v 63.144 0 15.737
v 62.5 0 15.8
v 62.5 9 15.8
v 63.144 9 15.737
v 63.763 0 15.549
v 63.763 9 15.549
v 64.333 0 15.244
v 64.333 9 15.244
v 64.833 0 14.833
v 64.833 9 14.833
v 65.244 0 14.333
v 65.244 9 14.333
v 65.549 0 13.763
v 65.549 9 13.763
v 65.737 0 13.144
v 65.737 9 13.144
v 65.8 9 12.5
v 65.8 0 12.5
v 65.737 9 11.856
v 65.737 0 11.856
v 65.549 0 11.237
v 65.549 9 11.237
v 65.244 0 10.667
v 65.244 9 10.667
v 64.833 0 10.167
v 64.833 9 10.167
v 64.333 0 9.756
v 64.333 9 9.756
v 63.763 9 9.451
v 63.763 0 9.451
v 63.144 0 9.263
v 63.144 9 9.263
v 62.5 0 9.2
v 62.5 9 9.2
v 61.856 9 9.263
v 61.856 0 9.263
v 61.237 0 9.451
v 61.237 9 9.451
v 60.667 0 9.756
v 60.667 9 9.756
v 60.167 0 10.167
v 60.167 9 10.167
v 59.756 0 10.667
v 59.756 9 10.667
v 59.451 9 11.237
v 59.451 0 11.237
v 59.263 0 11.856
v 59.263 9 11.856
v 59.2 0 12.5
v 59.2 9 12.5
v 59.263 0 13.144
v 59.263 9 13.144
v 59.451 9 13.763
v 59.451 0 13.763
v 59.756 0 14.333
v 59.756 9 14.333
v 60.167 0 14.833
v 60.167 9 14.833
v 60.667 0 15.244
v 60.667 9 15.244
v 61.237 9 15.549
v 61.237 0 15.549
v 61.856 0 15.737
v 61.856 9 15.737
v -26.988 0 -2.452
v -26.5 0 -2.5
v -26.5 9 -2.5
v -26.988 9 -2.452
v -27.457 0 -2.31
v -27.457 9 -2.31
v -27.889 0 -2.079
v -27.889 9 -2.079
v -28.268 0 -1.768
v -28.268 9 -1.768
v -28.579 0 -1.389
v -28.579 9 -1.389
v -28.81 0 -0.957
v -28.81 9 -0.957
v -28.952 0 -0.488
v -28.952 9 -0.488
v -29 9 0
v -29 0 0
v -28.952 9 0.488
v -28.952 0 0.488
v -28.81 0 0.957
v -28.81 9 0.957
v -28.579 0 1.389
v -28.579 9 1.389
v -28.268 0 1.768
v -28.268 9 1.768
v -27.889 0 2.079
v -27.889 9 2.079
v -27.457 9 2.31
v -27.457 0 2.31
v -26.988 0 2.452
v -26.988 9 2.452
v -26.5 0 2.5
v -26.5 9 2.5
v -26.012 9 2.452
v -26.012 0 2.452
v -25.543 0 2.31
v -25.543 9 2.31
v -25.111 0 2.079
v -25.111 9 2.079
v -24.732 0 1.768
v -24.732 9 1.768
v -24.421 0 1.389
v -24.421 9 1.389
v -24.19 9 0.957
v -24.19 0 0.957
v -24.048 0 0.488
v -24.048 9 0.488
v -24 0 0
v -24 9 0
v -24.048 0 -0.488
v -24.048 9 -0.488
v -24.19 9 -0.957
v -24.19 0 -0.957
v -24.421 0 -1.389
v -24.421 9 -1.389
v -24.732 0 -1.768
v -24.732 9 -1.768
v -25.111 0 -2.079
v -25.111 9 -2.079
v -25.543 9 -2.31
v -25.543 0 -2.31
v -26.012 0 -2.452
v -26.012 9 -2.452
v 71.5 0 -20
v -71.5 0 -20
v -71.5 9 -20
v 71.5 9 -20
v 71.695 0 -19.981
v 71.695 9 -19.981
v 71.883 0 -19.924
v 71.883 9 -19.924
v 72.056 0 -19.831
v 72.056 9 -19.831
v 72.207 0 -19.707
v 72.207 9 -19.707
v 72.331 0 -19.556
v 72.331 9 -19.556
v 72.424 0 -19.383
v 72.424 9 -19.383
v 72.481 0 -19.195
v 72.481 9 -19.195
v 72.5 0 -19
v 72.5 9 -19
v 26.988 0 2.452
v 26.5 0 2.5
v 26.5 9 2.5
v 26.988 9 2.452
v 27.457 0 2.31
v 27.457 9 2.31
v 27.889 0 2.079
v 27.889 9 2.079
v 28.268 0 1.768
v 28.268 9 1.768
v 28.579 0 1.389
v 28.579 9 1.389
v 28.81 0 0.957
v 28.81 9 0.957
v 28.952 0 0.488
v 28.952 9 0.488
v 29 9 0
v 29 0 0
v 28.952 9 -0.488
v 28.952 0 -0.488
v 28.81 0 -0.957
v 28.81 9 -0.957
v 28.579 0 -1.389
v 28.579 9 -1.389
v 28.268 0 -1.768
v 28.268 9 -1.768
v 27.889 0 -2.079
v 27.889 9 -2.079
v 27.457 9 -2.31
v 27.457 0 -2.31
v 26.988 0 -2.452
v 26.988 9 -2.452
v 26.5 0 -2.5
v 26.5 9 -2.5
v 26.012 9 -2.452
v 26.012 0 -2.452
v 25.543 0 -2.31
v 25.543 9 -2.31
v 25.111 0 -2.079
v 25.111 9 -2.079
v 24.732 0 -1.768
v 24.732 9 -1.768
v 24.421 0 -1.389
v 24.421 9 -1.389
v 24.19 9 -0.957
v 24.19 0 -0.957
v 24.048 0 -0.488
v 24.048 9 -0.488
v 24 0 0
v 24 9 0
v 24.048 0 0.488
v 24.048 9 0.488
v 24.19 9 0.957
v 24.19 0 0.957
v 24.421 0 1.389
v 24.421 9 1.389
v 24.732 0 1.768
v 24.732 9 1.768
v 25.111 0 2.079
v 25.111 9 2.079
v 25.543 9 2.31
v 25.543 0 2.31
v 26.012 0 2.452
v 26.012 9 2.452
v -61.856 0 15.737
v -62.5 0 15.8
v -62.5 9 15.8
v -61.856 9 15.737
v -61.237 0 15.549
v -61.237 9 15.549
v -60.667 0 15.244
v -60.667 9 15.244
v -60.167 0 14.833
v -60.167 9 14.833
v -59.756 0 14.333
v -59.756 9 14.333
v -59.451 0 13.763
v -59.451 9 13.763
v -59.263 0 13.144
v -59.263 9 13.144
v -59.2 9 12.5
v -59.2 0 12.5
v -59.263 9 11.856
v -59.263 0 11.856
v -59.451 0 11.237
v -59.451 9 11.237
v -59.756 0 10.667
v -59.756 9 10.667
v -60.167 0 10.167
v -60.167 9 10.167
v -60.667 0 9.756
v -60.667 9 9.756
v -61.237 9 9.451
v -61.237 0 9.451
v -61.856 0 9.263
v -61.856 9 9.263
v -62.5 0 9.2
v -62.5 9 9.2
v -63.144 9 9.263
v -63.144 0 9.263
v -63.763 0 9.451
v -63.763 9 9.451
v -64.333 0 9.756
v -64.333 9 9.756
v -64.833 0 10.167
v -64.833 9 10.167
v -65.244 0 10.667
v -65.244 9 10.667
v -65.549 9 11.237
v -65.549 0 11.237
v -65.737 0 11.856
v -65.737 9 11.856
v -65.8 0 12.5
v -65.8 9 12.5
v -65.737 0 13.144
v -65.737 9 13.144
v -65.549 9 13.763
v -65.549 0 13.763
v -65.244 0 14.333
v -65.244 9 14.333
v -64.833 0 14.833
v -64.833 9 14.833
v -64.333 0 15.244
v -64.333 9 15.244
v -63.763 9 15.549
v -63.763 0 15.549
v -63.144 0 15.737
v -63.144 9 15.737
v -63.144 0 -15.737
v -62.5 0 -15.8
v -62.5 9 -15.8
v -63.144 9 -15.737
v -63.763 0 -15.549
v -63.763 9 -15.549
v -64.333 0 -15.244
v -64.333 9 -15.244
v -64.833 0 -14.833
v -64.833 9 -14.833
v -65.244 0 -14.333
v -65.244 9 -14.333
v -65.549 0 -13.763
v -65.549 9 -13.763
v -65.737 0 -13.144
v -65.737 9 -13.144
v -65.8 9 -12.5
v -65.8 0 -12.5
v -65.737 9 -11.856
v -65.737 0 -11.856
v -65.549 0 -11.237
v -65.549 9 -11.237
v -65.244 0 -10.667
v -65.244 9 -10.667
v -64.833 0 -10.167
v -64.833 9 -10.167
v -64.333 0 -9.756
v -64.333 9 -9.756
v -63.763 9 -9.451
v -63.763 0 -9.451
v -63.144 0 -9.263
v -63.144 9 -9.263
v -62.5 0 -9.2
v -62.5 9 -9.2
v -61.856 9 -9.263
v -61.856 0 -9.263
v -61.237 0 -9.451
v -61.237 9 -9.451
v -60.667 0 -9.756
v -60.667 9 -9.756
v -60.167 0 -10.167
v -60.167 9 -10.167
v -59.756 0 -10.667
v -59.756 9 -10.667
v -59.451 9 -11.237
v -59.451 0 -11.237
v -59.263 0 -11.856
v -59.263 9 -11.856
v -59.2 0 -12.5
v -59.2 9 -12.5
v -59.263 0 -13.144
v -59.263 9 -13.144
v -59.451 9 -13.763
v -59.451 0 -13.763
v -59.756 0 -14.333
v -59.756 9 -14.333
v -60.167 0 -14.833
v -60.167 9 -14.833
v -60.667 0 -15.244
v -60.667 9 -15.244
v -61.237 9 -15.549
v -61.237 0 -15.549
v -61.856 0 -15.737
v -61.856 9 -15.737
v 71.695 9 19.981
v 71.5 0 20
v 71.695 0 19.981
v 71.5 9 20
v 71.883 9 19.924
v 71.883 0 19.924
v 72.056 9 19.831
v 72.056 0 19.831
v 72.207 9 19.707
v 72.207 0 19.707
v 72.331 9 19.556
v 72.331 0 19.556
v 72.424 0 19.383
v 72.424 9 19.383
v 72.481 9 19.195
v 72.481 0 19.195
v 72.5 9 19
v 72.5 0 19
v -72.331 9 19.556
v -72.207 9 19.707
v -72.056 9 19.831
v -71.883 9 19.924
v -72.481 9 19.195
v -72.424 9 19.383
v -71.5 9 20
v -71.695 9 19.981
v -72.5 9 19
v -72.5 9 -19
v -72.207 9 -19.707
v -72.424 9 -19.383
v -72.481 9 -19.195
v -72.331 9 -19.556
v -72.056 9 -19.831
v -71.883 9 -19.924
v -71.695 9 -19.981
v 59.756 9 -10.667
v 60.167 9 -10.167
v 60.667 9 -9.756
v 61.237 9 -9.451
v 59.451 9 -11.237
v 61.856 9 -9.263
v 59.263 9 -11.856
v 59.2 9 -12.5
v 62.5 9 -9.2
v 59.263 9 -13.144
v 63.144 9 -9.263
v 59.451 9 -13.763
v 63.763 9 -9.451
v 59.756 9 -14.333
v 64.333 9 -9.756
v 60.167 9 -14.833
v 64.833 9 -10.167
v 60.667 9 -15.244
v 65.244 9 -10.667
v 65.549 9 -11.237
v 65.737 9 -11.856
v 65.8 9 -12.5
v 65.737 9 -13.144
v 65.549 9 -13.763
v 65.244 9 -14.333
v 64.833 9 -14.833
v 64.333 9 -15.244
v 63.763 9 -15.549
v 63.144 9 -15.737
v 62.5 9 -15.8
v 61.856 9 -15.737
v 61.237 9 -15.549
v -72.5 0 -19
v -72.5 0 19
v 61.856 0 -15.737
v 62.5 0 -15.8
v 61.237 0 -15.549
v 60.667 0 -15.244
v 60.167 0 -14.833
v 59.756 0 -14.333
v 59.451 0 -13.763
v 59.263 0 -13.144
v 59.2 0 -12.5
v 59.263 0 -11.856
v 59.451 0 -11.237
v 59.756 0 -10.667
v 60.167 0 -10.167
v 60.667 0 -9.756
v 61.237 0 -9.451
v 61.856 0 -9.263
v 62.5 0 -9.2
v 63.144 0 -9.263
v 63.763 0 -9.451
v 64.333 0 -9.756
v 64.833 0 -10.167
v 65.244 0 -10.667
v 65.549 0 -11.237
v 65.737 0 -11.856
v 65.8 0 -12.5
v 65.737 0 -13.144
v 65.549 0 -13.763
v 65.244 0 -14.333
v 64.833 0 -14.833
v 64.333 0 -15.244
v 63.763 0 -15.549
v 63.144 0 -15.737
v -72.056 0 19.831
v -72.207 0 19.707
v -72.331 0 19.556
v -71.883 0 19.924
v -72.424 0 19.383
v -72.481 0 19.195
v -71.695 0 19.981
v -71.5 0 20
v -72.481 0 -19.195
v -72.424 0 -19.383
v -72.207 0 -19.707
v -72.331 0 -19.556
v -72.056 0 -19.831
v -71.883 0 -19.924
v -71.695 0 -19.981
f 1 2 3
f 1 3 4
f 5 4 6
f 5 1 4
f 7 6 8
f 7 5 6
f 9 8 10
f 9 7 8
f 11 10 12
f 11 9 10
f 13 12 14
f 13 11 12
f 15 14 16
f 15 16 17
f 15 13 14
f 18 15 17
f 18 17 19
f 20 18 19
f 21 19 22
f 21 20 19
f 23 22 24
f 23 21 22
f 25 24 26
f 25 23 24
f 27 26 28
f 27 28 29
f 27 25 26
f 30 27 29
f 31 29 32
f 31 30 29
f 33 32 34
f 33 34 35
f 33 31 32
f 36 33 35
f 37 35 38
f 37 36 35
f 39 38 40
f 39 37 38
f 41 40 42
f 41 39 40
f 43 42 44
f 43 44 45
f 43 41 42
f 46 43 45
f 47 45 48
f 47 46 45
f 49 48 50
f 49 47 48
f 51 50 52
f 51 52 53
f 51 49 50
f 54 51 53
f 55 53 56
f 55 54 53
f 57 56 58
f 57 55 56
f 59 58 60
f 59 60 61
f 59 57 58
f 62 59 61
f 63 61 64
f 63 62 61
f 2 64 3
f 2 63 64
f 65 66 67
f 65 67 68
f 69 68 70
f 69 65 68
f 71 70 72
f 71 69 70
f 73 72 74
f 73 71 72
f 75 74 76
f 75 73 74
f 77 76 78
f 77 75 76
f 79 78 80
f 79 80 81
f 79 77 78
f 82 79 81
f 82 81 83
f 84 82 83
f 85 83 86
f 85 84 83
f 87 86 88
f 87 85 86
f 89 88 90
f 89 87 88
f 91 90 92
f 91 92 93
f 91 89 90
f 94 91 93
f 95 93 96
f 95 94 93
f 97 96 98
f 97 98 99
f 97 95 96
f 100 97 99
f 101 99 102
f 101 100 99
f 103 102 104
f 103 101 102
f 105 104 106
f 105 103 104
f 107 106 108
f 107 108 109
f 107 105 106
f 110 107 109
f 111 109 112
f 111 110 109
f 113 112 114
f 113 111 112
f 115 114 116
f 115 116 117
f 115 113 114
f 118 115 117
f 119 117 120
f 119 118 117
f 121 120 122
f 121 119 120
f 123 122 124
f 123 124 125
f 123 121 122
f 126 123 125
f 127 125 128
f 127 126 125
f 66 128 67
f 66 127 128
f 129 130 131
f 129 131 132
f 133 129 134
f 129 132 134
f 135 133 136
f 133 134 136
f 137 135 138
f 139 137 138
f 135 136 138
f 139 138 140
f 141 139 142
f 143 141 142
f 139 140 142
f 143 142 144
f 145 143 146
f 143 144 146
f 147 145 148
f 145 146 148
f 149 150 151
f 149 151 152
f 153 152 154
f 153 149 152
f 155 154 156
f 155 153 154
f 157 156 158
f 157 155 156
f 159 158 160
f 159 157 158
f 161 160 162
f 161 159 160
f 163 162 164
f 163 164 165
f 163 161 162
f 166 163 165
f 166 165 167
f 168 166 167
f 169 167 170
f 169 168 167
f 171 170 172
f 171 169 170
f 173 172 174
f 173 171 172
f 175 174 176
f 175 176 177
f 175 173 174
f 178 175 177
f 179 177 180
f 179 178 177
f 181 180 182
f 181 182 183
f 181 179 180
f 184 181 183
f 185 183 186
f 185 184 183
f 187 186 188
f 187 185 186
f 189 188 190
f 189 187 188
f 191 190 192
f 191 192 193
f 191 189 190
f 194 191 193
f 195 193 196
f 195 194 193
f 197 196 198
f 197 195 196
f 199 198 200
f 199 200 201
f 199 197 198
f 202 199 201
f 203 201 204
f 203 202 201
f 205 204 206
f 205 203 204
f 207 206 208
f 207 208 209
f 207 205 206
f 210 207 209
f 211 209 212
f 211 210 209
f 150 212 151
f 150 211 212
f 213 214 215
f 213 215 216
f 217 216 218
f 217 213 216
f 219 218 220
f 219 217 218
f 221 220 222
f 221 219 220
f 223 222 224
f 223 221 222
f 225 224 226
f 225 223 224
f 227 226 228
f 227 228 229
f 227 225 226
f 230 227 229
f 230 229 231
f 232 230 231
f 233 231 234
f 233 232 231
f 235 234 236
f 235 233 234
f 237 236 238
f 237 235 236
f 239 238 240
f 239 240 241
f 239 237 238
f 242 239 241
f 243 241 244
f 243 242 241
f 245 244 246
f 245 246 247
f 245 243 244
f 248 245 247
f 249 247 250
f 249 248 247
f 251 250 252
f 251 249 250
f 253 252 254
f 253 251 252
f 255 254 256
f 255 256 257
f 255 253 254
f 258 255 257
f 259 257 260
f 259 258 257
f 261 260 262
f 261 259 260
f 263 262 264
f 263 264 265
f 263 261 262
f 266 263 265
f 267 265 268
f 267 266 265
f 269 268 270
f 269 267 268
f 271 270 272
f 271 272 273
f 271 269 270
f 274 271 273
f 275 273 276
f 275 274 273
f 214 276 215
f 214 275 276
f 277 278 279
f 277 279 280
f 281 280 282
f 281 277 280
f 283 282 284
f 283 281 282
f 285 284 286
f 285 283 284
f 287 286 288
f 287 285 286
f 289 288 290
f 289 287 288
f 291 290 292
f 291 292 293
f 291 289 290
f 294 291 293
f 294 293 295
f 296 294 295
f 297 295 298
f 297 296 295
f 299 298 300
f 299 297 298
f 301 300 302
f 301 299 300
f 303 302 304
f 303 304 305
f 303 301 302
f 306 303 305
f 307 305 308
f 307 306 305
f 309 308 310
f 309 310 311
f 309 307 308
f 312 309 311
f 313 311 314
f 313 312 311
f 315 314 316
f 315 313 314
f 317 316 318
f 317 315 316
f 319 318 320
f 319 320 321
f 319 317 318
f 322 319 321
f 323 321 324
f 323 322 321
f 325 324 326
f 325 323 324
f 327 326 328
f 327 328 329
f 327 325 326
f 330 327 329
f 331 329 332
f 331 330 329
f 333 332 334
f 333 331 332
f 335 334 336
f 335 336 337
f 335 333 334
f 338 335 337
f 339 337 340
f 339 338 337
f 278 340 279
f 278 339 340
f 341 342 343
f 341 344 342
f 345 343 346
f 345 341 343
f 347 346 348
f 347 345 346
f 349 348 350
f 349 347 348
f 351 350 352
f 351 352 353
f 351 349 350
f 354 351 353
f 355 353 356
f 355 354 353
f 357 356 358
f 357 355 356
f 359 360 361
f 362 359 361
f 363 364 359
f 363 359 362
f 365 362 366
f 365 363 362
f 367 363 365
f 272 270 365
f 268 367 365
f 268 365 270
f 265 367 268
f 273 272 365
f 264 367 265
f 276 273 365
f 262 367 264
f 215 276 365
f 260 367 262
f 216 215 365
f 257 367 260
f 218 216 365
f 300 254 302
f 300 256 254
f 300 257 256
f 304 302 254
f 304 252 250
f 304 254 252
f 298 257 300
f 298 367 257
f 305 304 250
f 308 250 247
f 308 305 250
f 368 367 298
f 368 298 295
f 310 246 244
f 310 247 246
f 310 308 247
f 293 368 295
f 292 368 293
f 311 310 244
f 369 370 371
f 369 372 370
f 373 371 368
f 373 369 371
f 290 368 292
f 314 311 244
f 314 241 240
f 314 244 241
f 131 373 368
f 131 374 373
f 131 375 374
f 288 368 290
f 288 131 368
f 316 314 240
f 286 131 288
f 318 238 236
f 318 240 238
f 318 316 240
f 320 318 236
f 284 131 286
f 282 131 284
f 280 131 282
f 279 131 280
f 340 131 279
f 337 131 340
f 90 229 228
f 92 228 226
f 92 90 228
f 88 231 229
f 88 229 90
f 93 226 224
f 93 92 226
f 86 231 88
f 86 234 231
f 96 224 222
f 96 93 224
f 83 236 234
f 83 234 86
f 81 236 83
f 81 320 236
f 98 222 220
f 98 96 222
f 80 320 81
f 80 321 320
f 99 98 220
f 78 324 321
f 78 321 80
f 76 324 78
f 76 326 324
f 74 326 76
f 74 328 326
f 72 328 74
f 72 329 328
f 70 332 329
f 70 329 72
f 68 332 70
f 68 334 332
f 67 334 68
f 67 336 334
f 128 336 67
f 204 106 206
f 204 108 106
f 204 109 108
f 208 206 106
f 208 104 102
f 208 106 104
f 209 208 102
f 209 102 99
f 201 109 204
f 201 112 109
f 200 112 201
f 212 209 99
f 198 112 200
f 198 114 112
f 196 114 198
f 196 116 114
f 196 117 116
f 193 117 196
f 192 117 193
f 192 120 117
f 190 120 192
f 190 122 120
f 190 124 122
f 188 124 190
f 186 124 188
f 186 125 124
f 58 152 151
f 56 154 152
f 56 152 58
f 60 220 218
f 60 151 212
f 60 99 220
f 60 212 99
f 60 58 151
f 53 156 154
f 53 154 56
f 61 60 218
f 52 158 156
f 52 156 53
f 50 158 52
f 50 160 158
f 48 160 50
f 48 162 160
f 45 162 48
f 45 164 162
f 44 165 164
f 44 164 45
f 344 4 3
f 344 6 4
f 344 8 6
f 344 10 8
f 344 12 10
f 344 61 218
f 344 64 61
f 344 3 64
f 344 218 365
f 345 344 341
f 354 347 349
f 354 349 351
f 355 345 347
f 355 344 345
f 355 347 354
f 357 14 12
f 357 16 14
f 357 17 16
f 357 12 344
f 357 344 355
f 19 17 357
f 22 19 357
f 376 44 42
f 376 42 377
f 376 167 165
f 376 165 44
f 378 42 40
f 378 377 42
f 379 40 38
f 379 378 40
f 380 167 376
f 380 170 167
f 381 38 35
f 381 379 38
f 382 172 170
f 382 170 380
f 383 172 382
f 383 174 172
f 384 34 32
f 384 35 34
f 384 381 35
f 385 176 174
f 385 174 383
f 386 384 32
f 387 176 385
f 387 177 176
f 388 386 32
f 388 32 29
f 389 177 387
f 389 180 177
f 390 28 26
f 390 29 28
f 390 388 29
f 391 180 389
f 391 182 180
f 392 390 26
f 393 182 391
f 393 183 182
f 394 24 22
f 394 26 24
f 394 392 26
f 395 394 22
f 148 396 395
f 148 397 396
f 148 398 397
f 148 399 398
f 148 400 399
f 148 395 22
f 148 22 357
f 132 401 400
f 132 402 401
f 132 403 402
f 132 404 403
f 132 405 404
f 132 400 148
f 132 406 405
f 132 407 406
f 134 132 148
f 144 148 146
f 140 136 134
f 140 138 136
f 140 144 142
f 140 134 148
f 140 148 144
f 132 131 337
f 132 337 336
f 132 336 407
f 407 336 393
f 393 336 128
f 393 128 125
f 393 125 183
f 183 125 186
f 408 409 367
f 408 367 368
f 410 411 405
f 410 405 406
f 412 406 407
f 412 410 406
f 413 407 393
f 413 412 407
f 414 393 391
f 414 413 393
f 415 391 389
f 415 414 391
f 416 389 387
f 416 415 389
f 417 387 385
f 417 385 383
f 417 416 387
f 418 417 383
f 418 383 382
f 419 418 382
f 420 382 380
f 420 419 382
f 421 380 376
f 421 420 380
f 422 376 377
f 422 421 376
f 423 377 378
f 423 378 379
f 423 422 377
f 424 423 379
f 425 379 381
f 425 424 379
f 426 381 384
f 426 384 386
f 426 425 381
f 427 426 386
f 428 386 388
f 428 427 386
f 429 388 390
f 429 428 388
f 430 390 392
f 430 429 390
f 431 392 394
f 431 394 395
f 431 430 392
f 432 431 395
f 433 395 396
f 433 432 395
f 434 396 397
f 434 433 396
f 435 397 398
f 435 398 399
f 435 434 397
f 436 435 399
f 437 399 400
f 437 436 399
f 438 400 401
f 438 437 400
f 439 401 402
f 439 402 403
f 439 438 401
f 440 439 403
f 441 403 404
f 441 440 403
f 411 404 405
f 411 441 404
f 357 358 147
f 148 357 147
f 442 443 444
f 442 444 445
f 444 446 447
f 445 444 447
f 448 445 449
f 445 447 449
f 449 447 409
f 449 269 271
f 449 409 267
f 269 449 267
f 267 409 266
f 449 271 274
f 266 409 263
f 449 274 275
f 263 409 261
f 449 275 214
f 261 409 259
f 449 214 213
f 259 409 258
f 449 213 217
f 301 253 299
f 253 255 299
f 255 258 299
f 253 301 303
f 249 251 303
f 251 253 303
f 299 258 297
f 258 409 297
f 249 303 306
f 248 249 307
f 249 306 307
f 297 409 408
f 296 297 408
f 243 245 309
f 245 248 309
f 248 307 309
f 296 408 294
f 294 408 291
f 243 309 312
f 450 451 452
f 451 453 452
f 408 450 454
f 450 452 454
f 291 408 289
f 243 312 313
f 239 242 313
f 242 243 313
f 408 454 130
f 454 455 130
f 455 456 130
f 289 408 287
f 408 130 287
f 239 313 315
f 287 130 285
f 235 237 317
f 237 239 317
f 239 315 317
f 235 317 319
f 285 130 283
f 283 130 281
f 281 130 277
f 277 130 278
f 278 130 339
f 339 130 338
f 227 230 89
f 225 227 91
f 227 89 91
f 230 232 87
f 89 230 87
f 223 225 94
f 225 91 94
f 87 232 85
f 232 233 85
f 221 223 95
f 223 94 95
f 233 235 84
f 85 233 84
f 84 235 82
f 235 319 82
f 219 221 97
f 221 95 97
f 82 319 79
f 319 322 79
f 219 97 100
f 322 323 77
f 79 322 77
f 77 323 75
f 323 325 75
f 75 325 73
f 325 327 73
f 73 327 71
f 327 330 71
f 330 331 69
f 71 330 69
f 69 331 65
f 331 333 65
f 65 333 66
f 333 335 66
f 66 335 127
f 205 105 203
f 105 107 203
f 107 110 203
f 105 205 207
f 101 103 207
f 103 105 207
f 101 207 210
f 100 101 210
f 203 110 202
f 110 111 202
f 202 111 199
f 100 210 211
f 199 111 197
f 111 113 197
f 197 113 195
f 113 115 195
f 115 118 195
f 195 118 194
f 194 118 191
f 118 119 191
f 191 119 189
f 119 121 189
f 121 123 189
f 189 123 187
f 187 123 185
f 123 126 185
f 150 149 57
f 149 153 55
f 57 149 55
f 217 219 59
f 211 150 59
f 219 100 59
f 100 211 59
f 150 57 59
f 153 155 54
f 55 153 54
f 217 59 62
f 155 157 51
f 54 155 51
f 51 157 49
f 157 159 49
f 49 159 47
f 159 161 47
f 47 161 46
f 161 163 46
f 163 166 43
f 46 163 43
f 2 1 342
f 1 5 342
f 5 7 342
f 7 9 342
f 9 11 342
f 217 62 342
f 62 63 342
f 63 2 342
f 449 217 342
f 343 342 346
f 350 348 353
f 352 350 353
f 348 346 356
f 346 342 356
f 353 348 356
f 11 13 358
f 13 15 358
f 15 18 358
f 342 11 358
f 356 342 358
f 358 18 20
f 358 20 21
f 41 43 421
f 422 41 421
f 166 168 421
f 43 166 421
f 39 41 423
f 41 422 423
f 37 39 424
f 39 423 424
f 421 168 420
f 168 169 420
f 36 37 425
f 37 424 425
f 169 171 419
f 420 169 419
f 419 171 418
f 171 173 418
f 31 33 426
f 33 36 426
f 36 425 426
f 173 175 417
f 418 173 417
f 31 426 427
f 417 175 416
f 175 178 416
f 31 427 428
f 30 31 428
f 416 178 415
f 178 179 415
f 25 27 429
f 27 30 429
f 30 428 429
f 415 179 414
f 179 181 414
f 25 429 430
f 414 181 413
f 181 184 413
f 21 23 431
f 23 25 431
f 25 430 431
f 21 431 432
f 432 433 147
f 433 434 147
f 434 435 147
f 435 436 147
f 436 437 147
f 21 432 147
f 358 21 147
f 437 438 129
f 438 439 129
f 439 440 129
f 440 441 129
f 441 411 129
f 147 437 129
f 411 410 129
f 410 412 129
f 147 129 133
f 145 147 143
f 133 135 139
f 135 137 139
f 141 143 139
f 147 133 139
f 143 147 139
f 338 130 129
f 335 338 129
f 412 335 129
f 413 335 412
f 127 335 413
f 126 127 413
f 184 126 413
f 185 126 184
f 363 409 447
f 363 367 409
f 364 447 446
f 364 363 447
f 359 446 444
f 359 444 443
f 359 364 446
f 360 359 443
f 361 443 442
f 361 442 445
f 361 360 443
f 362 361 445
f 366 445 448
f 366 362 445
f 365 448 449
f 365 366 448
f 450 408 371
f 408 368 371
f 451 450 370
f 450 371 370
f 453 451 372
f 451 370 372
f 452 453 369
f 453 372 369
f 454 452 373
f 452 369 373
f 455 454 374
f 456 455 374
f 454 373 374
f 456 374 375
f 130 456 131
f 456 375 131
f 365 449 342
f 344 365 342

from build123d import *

# Parameters (mm, degrees)
SKETCH1_W           = 145
SKETCH1_H           = 40
SKETCH1_R           = 2.5
SKETCH1_R_2         = 3.3
BOSS_EXTRUDE1_DEPTH = 9
FILLET1_R           = 1


with BuildPart() as part:
    # Sketch1 → Boss-Extrude1 (new body)
    with BuildSketch(Plane(origin=(0, 0, 0), x_dir=(1, 0, 0), z_dir=(0, 1, 0))):
        Rectangle(SKETCH1_W, SKETCH1_H)
        with Locations(Location((26.5, 0, 0), (0, 0, 270))):
            Circle(SKETCH1_R, mode=Mode.SUBTRACT)
        with Locations(Location((62.5, -12.5, 0), (0, 0, 270))):
            Circle(SKETCH1_R_2, mode=Mode.SUBTRACT)
        with Locations(Location((62.5, 12.5, 0), (0, 0, 90))):
            Circle(SKETCH1_R_2, mode=Mode.SUBTRACT)
        with Locations(Location((-26.5, 0, 0), (0, 0, 90))):
            Circle(SKETCH1_R, mode=Mode.SUBTRACT)
        with Locations(Location((-62.5, 12.5, 0), (0, 0, 90))):
            Circle(SKETCH1_R_2, mode=Mode.SUBTRACT)
        with Locations(Location((-62.5, -12.5, 0), (0, 0, 270))):
            Circle(SKETCH1_R_2, mode=Mode.SUBTRACT)
    extrude(amount=BOSS_EXTRUDE1_DEPTH)

    # Fillet1
    fillet1_edges = [part.edges().sort_by_distance(p)[0] for p in [
        (72.5, 4.5, 20),
        (-72.5, 4.5, 20),
        (-72.5, 4.5, -20),
        (72.5, 4.5, -20),
    ]]
    fillet(fillet1_edges, radius=FILLET1_R)


solid = part.part
